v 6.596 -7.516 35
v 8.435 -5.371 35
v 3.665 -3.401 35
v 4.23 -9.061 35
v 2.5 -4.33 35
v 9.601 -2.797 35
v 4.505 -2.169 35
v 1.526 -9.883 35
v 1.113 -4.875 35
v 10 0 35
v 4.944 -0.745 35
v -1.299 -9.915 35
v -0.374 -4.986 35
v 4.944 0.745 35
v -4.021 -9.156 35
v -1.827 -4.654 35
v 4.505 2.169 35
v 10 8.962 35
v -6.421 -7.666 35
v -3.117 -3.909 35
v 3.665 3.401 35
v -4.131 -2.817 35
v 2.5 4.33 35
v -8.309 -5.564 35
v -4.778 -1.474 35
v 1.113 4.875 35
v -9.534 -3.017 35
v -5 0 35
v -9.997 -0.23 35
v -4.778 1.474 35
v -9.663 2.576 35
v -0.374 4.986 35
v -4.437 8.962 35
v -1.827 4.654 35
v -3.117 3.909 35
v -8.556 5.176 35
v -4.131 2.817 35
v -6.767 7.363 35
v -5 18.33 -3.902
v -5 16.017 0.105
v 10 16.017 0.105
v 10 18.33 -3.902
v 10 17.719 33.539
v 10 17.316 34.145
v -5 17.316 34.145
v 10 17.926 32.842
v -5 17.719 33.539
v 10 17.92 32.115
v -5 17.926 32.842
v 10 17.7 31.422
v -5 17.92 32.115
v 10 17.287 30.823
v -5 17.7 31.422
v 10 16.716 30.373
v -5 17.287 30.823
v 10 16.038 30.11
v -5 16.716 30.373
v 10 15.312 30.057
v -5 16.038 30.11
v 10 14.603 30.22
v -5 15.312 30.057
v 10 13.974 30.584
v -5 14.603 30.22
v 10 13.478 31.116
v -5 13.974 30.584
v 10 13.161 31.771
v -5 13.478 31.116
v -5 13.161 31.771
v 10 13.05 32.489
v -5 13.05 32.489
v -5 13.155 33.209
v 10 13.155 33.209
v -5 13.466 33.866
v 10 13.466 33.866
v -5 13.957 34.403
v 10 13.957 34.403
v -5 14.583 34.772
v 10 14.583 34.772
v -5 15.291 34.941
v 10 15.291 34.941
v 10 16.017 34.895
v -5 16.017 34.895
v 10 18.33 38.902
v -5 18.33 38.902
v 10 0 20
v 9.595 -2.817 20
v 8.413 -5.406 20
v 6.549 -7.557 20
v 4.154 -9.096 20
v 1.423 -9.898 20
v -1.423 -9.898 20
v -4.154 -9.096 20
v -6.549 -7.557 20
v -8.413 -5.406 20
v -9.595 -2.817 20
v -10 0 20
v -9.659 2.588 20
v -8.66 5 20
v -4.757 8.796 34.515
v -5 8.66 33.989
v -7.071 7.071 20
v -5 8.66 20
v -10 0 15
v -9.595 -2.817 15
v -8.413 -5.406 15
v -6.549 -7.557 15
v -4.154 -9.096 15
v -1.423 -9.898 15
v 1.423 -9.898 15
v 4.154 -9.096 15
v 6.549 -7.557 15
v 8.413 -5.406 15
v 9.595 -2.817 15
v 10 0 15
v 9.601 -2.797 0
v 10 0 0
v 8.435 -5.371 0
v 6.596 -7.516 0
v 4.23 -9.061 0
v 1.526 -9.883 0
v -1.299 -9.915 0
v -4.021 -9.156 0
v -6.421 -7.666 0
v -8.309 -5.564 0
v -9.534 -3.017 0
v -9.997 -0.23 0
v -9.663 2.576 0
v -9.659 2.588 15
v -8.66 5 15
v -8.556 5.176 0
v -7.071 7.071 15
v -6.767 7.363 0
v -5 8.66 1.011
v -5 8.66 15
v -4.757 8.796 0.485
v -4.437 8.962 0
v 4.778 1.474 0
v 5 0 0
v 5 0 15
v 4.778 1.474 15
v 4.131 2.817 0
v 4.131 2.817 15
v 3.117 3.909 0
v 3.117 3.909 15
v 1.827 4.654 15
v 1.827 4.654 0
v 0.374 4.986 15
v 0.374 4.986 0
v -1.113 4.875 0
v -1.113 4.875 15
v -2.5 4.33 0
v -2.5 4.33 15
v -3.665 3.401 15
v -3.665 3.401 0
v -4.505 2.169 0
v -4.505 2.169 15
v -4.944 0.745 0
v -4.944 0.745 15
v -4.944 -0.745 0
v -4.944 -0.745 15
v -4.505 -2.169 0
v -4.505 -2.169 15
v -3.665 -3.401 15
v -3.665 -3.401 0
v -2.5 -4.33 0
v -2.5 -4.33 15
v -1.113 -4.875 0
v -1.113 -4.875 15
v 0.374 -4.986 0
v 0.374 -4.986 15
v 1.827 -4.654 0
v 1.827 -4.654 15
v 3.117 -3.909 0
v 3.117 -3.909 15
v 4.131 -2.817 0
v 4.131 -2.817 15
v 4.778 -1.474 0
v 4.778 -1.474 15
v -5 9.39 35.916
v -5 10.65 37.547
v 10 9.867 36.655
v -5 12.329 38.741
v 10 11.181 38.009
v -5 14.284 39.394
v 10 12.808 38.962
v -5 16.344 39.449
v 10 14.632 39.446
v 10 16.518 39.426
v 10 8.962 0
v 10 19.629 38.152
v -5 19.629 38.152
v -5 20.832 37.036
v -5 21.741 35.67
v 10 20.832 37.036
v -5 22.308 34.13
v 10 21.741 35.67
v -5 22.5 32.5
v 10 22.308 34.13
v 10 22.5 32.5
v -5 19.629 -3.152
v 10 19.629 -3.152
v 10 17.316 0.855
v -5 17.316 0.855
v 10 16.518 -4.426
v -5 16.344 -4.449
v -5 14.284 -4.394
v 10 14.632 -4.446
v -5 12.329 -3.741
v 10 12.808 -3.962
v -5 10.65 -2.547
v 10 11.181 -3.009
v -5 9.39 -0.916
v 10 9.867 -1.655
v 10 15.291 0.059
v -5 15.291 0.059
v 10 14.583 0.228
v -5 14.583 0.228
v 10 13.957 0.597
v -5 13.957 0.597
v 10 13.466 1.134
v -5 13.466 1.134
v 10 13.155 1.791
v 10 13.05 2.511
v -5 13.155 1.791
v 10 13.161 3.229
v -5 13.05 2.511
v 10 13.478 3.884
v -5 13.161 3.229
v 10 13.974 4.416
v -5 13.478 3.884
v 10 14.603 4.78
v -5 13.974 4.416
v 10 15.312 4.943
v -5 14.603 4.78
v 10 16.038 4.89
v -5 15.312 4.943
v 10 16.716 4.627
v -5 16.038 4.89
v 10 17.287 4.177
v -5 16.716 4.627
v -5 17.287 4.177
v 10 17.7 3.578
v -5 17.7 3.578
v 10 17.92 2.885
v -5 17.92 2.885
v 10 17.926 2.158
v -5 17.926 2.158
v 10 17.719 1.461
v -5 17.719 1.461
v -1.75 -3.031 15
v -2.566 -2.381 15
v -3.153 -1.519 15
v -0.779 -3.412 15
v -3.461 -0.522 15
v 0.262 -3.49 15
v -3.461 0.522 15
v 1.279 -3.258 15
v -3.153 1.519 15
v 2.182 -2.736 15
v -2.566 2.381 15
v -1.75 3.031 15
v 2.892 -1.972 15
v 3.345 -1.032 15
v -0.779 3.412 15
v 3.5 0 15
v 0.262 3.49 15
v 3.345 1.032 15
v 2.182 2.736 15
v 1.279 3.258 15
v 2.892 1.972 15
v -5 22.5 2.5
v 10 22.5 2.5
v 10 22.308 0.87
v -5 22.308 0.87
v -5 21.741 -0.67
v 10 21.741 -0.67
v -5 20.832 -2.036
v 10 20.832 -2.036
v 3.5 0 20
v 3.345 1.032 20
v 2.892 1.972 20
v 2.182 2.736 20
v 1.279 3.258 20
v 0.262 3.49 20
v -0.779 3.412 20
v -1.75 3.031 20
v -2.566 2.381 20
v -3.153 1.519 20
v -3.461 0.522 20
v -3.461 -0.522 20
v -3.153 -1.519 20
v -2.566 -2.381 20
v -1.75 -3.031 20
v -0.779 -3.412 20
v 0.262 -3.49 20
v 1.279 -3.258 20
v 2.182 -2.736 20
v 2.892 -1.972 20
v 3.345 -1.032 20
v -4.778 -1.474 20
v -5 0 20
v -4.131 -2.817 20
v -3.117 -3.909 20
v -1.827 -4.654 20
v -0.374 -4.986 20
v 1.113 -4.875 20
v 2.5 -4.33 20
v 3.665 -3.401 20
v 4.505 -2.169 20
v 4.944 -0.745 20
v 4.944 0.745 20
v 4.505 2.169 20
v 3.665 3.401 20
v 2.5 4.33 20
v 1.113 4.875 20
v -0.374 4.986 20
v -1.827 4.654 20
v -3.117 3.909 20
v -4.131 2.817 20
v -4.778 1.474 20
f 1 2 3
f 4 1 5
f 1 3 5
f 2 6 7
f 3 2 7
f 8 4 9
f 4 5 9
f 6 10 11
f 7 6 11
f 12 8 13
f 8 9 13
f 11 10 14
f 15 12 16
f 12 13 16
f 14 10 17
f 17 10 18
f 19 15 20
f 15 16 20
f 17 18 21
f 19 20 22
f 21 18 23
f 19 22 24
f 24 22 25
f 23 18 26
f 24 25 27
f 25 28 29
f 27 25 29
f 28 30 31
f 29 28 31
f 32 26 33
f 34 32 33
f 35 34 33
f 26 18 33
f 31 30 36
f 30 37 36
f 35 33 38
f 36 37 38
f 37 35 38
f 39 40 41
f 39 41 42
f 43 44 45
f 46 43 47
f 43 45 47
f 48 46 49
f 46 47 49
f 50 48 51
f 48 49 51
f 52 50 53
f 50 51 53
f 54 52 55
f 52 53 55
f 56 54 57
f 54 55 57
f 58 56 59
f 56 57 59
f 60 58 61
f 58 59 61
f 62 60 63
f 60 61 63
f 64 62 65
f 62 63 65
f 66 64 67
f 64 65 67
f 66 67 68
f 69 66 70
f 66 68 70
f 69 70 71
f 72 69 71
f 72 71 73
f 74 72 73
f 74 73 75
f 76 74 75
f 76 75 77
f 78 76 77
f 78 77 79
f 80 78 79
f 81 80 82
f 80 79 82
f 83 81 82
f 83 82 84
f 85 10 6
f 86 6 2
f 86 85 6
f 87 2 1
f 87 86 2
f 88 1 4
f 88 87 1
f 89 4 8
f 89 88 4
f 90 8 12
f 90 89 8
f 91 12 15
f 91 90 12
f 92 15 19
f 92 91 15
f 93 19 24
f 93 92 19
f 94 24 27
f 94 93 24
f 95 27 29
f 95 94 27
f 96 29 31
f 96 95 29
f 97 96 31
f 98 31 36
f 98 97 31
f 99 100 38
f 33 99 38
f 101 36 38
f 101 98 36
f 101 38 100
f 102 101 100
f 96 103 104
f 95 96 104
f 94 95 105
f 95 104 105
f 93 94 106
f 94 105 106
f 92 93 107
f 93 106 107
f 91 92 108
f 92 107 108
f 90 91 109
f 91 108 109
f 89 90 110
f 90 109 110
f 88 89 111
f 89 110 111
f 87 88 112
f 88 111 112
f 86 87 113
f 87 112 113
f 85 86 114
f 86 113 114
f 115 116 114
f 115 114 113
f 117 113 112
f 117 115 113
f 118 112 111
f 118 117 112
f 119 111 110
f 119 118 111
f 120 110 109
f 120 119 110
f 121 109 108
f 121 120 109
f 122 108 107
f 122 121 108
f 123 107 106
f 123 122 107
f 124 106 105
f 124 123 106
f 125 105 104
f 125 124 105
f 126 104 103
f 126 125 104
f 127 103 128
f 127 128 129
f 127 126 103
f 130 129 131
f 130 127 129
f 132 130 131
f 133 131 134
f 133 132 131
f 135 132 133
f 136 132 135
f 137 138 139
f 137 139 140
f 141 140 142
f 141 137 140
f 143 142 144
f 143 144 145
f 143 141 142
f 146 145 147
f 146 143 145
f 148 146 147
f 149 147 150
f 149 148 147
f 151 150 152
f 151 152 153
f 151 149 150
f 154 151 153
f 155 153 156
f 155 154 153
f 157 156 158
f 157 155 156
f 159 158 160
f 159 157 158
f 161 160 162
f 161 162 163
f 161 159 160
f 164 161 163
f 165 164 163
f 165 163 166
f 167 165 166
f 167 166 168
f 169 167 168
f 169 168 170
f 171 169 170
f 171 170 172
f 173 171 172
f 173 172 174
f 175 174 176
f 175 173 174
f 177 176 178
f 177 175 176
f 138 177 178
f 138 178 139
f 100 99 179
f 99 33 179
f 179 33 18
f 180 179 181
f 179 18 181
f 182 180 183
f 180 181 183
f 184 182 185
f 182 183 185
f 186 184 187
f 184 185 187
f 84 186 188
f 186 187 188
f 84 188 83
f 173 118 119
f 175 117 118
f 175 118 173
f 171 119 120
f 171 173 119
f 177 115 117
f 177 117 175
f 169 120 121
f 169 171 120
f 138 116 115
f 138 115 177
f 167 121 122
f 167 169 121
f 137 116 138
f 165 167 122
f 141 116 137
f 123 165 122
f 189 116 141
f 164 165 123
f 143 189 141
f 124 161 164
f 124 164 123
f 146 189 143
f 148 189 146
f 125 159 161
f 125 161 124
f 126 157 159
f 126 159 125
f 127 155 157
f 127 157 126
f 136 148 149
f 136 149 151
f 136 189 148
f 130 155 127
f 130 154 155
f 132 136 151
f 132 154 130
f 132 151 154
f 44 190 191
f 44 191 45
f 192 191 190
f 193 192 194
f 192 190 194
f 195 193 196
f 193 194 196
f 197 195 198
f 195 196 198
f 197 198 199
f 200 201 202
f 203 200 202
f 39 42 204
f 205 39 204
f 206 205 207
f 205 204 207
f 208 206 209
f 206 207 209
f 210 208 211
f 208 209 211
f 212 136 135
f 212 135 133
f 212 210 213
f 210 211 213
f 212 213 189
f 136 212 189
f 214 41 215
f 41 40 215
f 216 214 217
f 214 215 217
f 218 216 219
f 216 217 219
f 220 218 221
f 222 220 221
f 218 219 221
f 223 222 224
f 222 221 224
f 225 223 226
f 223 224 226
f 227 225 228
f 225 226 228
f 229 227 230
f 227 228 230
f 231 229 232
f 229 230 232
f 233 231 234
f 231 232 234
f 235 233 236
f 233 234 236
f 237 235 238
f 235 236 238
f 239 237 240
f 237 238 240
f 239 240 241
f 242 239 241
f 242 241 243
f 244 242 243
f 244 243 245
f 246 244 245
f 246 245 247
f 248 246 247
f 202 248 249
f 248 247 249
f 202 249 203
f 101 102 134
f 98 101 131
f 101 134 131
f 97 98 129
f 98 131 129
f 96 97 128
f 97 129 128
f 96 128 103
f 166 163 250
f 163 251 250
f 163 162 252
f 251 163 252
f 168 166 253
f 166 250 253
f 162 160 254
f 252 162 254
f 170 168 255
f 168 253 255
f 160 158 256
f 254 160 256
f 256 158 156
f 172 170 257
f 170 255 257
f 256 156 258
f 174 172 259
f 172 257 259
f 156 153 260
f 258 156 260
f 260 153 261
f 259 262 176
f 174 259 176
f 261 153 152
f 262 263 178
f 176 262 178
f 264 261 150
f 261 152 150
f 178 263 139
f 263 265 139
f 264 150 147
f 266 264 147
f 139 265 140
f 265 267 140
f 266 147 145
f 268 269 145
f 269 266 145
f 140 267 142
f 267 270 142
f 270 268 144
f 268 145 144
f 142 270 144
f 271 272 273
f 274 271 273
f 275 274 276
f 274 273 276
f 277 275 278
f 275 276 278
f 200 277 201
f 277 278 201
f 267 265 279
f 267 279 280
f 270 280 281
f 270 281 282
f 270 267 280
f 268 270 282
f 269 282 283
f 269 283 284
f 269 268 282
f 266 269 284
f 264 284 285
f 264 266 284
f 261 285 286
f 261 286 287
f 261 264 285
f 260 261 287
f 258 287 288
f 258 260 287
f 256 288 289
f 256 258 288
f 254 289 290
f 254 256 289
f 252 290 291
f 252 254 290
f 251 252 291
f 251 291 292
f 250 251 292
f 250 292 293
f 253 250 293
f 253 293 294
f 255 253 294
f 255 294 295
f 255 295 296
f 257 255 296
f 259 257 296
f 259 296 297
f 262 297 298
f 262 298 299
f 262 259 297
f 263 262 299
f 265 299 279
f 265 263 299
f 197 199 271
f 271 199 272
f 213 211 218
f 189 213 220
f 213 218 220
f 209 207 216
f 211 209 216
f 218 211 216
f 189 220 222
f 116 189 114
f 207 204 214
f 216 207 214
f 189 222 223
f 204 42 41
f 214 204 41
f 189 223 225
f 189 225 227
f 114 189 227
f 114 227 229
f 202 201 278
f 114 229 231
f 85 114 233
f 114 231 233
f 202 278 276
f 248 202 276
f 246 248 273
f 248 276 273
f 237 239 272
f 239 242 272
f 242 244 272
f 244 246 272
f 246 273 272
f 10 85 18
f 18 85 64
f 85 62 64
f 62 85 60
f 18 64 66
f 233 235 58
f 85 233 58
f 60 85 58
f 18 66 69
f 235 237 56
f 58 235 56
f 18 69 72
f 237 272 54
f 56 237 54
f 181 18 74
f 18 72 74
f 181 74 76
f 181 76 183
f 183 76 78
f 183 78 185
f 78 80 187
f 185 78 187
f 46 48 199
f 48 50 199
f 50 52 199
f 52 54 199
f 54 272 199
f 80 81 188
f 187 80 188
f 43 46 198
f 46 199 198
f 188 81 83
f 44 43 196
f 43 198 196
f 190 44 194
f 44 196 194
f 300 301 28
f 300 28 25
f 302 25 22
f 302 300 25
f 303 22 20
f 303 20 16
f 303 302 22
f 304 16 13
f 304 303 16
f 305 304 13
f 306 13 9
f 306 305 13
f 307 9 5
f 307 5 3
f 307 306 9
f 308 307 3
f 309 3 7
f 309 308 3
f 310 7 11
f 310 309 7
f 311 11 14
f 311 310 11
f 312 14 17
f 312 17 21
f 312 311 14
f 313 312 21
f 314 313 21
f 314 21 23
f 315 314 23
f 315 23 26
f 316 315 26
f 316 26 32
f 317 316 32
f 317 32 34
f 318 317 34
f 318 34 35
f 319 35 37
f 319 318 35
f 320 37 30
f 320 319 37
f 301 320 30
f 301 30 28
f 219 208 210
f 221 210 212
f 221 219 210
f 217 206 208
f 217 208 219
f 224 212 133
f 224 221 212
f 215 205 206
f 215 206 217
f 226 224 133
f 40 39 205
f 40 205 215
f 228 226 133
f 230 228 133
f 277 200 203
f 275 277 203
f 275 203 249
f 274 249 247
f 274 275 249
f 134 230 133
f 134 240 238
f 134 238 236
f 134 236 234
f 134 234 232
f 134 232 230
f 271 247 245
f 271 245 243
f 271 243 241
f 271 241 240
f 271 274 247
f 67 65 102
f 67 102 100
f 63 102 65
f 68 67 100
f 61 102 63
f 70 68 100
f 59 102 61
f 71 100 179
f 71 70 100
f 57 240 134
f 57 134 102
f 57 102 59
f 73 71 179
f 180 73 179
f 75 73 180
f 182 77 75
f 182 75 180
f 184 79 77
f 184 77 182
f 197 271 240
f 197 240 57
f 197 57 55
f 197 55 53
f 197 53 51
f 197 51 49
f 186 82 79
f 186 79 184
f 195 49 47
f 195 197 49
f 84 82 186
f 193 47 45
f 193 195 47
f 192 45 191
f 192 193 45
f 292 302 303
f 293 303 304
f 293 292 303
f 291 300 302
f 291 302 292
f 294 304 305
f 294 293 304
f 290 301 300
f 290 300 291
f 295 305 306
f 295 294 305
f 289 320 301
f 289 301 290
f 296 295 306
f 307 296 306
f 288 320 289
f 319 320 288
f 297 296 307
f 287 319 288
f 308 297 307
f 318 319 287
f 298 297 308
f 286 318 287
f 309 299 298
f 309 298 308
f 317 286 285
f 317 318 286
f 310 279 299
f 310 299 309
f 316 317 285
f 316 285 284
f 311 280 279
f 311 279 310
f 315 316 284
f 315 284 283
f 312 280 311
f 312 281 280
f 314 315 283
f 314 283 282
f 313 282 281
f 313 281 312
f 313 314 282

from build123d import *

# Parameters (mm, degrees)
SKETCH1_R                = 5
BOSS_EXTRUDE1_DEPTH      = 15
SKETCH3_R                = 3.5
BOSS_EXTRUDE2_DEPTH      = 5
SKETCH4_R                = 5
BOSS_EXTRUDE3_DEPTH      = 15
BOSS_EXTRUDE4_DEPTH      = 5
BOSS_EXTRUDE4_DEPTH_BACK = 10
SKETCH7_R                = 2.45
CUT_EXTRUDE1_DEPTH       = 48.86961474
CUT_EXTRUDE2_DEPTH       = 50.663870332


with BuildPart() as part:
    # Sketch1 → Boss-Extrude1 (new body)
    with BuildSketch(Plane.XY):
        with BuildLine():
            Line((0, 12), (10, 12))
            Line((10, 12), (10, 0))
            ThreePointArc((10, 0), (-7.071067812, -7.071067812), (0, 10))
            Line((0, 10), (0, 12))
        make_face()
        Circle(SKETCH1_R, mode=Mode.SUBTRACT)
    extrude(amount=BOSS_EXTRUDE1_DEPTH)

    # Sketch3 → Boss-Extrude2 (add)
    with BuildSketch(Plane.XY.offset(15)):
        with BuildLine():
            Line((10, 0), (10, 12))
            Line((10, 12), (0, 12))
            Line((0, 12), (0, 10))
            ThreePointArc((0, 10), (-7.071067812, 7.071067812), (-10, 0))
            ThreePointArc((-10, 0), (0, -10), (10, 0))
        make_face()
        Circle(SKETCH3_R, mode=Mode.SUBTRACT)
    extrude(amount=BOSS_EXTRUDE2_DEPTH)

    # Sketch4 → Boss-Extrude3 (add)
    with BuildSketch(Plane.XY.offset(20)):
        with BuildLine():
            Line((0, 12), (10, 12))
            Line((10, 12), (10, 0))
            ThreePointArc((10, 0), (-7.071067812, -7.071067812), (0, 10))
            Line((0, 10), (0, 12))
        make_face()
        with Locations(Location((0, 0, 0), (0, 0, 180))):
            Circle(SKETCH4_R, mode=Mode.SUBTRACT)
    extrude(amount=BOSS_EXTRUDE3_DEPTH)

    # Sketch6 → Boss-Extrude4 (add, two sides: drawn at the far end of the back side and taken through both)
    with BuildSketch(Plane.ZY.offset(-BOSS_EXTRUDE4_DEPTH_BACK)):
        with BuildLine():
            Line((9.5, 22.5), (2.5, 22.5))
            ThreePointArc((2.5, 22.5), (-4.5, 15.5), (2.5, 8.5))
            Line((2.5, 8.5), (32.5, 8.5))
            ThreePointArc((32.5, 8.5), (39.5, 15.5), (32.5, 22.5))
            Line((32.5, 22.5), (25.5, 22.5))
            Line((25.5, 22.5), (9.5, 22.5))
        make_face()
    extrude(amount=BOSS_EXTRUDE4_DEPTH + BOSS_EXTRUDE4_DEPTH_BACK)

    # Sketch7 → Cut-Extrude1 (cut, through all)
    with BuildSketch(Plane.ZY.offset(5)):
        with Locations((2.5, 15.5)):
            Circle(SKETCH7_R)
        with Locations((32.5, 15.5)):
            Circle(SKETCH7_R)
    extrude(amount=-CUT_EXTRUDE1_DEPTH, mode=Mode.SUBTRACT)

    # Sketch8 → Cut-Extrude2 (cut, through all)
    with BuildSketch(Plane(origin=(10, 0, 0), x_dir=(0, 0, -1), z_dir=(1, 0, 0))):
        Polygon((-32.125, 16.149519053), (-32.875, 14.850480947), (-38.937177826, 18.350480947), (-38.187177826, 19.649519053), align=None)
        Polygon((-2.875, 16.149519053), (-2.125, 14.850480947), (3.937177826, 18.350480947), (3.187177826, 19.649519053), align=None)
    extrude(amount=-CUT_EXTRUDE2_DEPTH, mode=Mode.SUBTRACT)


solid = part.part
